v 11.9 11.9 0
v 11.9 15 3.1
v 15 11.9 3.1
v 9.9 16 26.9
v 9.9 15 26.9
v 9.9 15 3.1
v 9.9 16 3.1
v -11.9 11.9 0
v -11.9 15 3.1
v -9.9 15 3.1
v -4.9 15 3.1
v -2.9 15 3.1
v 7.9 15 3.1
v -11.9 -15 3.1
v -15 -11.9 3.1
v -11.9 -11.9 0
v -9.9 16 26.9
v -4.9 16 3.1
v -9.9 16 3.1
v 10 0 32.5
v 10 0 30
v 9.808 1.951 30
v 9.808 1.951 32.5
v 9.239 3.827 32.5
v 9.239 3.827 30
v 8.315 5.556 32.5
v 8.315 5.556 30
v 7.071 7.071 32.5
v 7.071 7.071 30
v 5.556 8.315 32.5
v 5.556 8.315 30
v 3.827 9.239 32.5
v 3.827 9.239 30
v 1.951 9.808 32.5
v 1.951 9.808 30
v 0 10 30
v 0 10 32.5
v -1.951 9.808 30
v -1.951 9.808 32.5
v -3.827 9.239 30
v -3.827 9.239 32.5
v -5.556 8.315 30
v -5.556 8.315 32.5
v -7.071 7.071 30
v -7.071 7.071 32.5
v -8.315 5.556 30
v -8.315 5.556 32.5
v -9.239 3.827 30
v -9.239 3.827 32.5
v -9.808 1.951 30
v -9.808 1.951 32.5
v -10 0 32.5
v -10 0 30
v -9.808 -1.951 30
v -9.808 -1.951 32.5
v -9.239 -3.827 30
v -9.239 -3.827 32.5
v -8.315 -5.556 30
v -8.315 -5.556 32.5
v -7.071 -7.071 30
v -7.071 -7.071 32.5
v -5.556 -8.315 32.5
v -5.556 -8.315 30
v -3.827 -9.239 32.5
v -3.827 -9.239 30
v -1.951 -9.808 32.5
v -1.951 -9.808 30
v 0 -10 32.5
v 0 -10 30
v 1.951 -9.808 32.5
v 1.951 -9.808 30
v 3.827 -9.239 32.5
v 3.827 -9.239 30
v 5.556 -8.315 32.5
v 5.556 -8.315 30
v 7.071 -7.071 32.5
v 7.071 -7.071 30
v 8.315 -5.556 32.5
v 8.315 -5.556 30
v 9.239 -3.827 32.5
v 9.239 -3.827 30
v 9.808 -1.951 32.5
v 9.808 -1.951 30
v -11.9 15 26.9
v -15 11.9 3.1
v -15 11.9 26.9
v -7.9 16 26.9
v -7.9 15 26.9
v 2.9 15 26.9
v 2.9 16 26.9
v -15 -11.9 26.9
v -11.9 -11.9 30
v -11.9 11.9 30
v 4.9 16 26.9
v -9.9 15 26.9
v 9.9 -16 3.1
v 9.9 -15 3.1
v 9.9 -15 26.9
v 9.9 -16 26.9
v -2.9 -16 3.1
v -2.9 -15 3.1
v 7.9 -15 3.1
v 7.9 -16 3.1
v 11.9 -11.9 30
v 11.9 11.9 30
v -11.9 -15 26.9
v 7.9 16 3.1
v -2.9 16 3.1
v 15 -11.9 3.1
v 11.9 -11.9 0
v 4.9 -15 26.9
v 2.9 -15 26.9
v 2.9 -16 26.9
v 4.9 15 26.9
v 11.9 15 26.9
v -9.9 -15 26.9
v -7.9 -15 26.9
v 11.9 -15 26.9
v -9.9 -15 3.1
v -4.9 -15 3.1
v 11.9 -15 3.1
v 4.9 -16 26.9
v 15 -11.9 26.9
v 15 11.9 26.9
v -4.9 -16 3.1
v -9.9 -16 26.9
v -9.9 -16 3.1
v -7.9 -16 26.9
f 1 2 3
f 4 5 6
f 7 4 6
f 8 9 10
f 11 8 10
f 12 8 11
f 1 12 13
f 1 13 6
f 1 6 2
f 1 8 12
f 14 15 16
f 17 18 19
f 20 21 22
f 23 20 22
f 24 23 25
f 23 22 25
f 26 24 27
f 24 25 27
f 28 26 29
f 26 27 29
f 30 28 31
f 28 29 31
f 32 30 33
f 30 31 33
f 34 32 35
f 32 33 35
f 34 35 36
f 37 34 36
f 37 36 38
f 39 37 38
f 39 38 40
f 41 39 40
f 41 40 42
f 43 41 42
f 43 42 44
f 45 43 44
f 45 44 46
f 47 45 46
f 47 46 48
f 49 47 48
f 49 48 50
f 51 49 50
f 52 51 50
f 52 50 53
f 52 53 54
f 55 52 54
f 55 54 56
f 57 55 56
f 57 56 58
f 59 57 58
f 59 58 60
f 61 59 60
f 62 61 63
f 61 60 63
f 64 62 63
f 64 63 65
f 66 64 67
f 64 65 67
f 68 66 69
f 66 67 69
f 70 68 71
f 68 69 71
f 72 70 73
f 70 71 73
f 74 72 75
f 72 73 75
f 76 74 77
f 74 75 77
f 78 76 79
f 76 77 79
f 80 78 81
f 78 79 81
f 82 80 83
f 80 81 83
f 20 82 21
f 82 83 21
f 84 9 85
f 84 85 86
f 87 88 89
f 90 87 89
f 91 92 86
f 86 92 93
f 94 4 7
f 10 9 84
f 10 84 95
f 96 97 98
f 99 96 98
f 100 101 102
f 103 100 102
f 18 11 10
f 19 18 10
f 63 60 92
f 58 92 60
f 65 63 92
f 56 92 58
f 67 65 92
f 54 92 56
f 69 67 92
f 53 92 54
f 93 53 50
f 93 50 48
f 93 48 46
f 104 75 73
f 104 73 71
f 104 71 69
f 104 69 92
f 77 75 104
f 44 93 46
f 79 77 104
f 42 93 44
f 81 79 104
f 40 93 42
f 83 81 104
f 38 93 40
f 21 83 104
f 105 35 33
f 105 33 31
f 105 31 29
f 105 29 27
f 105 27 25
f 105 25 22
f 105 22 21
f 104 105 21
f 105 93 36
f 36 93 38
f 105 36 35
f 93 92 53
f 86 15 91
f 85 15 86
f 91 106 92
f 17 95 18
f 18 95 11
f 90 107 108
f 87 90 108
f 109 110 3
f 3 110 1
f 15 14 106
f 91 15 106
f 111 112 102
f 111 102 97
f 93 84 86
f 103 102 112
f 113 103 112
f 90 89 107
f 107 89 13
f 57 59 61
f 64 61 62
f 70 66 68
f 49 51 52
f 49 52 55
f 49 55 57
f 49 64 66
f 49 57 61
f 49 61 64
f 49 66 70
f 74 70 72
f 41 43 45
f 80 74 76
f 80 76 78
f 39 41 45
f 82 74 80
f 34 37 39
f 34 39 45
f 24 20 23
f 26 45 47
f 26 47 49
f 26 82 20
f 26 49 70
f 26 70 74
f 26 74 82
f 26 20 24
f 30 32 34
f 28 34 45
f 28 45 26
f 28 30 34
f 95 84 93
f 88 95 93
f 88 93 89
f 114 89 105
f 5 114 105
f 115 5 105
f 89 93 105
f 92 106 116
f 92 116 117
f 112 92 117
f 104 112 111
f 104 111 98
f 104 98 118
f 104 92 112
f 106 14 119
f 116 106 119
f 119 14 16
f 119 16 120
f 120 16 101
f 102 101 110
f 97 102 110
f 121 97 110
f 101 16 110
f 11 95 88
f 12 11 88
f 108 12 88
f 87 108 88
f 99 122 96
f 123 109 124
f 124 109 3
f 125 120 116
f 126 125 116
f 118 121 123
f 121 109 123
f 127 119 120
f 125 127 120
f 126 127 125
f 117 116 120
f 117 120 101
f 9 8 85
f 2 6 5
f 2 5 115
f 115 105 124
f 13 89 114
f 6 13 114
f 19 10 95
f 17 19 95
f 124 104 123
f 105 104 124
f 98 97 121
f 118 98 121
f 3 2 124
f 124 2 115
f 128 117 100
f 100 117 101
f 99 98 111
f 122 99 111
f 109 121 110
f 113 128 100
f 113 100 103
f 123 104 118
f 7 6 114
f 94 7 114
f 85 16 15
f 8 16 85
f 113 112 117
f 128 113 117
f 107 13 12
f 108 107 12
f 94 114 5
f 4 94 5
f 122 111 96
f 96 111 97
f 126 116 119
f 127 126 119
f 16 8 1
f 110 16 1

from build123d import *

# Parameters (mm, degrees)
F0_W     = 30
F0_H     = 30
F1_DEPTH = 30
F2_SIZE  = 3.1
F3_R     = 10
F4_DEPTH = 32.5
F6_DEPTH = 1
F8_DEPTH = 1


with BuildPart() as f1:
    # F0 (on Top) → F1 (new body)
    with BuildSketch(Plane.XY):
        Rectangle(F0_W, F0_H)
    extrude(amount=F1_DEPTH)

    # F2
    f2_edges = [f1.edges().sort_by_distance(p)[0] for p in [
        (0, -15, 30),
        (15, 0, 30),
        (15, -15, 15),
        (-15, 0, 0),
        (0, 15, 0),
        (-15, 15, 15),
        (0, 15, 30),
        (15, 15, 15),
        (-15, -15, 15),
        (0, -15, 0),
        (15, 0, 0),
        (-15, 0, 30),
    ]]
    chamfer(f2_edges, length=F2_SIZE)

    # F3 (on Top) → F4 (join)
    with BuildSketch(Plane.XY):
        Circle(F3_R)
    extrude(amount=F4_DEPTH)

    # F5 (on face) → F6 (join)
    with BuildSketch(Plane.XZ.offset(15)):
        Polygon((-9.9, 26.9), (-9.9, 3.1), (-4.9, 3.1), align=None)
        Polygon((9.9, 3.1), (9.9, 26.9), (4.9, 26.9), align=None)
        Polygon((-7.9, 26.9), (-2.9, 3.1), (7.9, 3.1), (2.9, 26.9), align=None)
    extrude(amount=F6_DEPTH)

    # F7 (on face) → F8 (join)
    with BuildSketch(Plane(origin=(0, 15, 0), x_dir=(-1, 0, 0), z_dir=(0, 1, 0))):
        Polygon((-2.9, 26.9), (-7.9, 3.1), (2.9, 3.1), (7.9, 26.9), align=None)
        Polygon((9.9, 26.9), (4.9, 3.1), (9.9, 3.1), align=None)
        Polygon((-4.9, 26.9), (-9.9, 26.9), (-9.9, 3.1), align=None)
    extrude(amount=F8_DEPTH)


solid = f1.part
